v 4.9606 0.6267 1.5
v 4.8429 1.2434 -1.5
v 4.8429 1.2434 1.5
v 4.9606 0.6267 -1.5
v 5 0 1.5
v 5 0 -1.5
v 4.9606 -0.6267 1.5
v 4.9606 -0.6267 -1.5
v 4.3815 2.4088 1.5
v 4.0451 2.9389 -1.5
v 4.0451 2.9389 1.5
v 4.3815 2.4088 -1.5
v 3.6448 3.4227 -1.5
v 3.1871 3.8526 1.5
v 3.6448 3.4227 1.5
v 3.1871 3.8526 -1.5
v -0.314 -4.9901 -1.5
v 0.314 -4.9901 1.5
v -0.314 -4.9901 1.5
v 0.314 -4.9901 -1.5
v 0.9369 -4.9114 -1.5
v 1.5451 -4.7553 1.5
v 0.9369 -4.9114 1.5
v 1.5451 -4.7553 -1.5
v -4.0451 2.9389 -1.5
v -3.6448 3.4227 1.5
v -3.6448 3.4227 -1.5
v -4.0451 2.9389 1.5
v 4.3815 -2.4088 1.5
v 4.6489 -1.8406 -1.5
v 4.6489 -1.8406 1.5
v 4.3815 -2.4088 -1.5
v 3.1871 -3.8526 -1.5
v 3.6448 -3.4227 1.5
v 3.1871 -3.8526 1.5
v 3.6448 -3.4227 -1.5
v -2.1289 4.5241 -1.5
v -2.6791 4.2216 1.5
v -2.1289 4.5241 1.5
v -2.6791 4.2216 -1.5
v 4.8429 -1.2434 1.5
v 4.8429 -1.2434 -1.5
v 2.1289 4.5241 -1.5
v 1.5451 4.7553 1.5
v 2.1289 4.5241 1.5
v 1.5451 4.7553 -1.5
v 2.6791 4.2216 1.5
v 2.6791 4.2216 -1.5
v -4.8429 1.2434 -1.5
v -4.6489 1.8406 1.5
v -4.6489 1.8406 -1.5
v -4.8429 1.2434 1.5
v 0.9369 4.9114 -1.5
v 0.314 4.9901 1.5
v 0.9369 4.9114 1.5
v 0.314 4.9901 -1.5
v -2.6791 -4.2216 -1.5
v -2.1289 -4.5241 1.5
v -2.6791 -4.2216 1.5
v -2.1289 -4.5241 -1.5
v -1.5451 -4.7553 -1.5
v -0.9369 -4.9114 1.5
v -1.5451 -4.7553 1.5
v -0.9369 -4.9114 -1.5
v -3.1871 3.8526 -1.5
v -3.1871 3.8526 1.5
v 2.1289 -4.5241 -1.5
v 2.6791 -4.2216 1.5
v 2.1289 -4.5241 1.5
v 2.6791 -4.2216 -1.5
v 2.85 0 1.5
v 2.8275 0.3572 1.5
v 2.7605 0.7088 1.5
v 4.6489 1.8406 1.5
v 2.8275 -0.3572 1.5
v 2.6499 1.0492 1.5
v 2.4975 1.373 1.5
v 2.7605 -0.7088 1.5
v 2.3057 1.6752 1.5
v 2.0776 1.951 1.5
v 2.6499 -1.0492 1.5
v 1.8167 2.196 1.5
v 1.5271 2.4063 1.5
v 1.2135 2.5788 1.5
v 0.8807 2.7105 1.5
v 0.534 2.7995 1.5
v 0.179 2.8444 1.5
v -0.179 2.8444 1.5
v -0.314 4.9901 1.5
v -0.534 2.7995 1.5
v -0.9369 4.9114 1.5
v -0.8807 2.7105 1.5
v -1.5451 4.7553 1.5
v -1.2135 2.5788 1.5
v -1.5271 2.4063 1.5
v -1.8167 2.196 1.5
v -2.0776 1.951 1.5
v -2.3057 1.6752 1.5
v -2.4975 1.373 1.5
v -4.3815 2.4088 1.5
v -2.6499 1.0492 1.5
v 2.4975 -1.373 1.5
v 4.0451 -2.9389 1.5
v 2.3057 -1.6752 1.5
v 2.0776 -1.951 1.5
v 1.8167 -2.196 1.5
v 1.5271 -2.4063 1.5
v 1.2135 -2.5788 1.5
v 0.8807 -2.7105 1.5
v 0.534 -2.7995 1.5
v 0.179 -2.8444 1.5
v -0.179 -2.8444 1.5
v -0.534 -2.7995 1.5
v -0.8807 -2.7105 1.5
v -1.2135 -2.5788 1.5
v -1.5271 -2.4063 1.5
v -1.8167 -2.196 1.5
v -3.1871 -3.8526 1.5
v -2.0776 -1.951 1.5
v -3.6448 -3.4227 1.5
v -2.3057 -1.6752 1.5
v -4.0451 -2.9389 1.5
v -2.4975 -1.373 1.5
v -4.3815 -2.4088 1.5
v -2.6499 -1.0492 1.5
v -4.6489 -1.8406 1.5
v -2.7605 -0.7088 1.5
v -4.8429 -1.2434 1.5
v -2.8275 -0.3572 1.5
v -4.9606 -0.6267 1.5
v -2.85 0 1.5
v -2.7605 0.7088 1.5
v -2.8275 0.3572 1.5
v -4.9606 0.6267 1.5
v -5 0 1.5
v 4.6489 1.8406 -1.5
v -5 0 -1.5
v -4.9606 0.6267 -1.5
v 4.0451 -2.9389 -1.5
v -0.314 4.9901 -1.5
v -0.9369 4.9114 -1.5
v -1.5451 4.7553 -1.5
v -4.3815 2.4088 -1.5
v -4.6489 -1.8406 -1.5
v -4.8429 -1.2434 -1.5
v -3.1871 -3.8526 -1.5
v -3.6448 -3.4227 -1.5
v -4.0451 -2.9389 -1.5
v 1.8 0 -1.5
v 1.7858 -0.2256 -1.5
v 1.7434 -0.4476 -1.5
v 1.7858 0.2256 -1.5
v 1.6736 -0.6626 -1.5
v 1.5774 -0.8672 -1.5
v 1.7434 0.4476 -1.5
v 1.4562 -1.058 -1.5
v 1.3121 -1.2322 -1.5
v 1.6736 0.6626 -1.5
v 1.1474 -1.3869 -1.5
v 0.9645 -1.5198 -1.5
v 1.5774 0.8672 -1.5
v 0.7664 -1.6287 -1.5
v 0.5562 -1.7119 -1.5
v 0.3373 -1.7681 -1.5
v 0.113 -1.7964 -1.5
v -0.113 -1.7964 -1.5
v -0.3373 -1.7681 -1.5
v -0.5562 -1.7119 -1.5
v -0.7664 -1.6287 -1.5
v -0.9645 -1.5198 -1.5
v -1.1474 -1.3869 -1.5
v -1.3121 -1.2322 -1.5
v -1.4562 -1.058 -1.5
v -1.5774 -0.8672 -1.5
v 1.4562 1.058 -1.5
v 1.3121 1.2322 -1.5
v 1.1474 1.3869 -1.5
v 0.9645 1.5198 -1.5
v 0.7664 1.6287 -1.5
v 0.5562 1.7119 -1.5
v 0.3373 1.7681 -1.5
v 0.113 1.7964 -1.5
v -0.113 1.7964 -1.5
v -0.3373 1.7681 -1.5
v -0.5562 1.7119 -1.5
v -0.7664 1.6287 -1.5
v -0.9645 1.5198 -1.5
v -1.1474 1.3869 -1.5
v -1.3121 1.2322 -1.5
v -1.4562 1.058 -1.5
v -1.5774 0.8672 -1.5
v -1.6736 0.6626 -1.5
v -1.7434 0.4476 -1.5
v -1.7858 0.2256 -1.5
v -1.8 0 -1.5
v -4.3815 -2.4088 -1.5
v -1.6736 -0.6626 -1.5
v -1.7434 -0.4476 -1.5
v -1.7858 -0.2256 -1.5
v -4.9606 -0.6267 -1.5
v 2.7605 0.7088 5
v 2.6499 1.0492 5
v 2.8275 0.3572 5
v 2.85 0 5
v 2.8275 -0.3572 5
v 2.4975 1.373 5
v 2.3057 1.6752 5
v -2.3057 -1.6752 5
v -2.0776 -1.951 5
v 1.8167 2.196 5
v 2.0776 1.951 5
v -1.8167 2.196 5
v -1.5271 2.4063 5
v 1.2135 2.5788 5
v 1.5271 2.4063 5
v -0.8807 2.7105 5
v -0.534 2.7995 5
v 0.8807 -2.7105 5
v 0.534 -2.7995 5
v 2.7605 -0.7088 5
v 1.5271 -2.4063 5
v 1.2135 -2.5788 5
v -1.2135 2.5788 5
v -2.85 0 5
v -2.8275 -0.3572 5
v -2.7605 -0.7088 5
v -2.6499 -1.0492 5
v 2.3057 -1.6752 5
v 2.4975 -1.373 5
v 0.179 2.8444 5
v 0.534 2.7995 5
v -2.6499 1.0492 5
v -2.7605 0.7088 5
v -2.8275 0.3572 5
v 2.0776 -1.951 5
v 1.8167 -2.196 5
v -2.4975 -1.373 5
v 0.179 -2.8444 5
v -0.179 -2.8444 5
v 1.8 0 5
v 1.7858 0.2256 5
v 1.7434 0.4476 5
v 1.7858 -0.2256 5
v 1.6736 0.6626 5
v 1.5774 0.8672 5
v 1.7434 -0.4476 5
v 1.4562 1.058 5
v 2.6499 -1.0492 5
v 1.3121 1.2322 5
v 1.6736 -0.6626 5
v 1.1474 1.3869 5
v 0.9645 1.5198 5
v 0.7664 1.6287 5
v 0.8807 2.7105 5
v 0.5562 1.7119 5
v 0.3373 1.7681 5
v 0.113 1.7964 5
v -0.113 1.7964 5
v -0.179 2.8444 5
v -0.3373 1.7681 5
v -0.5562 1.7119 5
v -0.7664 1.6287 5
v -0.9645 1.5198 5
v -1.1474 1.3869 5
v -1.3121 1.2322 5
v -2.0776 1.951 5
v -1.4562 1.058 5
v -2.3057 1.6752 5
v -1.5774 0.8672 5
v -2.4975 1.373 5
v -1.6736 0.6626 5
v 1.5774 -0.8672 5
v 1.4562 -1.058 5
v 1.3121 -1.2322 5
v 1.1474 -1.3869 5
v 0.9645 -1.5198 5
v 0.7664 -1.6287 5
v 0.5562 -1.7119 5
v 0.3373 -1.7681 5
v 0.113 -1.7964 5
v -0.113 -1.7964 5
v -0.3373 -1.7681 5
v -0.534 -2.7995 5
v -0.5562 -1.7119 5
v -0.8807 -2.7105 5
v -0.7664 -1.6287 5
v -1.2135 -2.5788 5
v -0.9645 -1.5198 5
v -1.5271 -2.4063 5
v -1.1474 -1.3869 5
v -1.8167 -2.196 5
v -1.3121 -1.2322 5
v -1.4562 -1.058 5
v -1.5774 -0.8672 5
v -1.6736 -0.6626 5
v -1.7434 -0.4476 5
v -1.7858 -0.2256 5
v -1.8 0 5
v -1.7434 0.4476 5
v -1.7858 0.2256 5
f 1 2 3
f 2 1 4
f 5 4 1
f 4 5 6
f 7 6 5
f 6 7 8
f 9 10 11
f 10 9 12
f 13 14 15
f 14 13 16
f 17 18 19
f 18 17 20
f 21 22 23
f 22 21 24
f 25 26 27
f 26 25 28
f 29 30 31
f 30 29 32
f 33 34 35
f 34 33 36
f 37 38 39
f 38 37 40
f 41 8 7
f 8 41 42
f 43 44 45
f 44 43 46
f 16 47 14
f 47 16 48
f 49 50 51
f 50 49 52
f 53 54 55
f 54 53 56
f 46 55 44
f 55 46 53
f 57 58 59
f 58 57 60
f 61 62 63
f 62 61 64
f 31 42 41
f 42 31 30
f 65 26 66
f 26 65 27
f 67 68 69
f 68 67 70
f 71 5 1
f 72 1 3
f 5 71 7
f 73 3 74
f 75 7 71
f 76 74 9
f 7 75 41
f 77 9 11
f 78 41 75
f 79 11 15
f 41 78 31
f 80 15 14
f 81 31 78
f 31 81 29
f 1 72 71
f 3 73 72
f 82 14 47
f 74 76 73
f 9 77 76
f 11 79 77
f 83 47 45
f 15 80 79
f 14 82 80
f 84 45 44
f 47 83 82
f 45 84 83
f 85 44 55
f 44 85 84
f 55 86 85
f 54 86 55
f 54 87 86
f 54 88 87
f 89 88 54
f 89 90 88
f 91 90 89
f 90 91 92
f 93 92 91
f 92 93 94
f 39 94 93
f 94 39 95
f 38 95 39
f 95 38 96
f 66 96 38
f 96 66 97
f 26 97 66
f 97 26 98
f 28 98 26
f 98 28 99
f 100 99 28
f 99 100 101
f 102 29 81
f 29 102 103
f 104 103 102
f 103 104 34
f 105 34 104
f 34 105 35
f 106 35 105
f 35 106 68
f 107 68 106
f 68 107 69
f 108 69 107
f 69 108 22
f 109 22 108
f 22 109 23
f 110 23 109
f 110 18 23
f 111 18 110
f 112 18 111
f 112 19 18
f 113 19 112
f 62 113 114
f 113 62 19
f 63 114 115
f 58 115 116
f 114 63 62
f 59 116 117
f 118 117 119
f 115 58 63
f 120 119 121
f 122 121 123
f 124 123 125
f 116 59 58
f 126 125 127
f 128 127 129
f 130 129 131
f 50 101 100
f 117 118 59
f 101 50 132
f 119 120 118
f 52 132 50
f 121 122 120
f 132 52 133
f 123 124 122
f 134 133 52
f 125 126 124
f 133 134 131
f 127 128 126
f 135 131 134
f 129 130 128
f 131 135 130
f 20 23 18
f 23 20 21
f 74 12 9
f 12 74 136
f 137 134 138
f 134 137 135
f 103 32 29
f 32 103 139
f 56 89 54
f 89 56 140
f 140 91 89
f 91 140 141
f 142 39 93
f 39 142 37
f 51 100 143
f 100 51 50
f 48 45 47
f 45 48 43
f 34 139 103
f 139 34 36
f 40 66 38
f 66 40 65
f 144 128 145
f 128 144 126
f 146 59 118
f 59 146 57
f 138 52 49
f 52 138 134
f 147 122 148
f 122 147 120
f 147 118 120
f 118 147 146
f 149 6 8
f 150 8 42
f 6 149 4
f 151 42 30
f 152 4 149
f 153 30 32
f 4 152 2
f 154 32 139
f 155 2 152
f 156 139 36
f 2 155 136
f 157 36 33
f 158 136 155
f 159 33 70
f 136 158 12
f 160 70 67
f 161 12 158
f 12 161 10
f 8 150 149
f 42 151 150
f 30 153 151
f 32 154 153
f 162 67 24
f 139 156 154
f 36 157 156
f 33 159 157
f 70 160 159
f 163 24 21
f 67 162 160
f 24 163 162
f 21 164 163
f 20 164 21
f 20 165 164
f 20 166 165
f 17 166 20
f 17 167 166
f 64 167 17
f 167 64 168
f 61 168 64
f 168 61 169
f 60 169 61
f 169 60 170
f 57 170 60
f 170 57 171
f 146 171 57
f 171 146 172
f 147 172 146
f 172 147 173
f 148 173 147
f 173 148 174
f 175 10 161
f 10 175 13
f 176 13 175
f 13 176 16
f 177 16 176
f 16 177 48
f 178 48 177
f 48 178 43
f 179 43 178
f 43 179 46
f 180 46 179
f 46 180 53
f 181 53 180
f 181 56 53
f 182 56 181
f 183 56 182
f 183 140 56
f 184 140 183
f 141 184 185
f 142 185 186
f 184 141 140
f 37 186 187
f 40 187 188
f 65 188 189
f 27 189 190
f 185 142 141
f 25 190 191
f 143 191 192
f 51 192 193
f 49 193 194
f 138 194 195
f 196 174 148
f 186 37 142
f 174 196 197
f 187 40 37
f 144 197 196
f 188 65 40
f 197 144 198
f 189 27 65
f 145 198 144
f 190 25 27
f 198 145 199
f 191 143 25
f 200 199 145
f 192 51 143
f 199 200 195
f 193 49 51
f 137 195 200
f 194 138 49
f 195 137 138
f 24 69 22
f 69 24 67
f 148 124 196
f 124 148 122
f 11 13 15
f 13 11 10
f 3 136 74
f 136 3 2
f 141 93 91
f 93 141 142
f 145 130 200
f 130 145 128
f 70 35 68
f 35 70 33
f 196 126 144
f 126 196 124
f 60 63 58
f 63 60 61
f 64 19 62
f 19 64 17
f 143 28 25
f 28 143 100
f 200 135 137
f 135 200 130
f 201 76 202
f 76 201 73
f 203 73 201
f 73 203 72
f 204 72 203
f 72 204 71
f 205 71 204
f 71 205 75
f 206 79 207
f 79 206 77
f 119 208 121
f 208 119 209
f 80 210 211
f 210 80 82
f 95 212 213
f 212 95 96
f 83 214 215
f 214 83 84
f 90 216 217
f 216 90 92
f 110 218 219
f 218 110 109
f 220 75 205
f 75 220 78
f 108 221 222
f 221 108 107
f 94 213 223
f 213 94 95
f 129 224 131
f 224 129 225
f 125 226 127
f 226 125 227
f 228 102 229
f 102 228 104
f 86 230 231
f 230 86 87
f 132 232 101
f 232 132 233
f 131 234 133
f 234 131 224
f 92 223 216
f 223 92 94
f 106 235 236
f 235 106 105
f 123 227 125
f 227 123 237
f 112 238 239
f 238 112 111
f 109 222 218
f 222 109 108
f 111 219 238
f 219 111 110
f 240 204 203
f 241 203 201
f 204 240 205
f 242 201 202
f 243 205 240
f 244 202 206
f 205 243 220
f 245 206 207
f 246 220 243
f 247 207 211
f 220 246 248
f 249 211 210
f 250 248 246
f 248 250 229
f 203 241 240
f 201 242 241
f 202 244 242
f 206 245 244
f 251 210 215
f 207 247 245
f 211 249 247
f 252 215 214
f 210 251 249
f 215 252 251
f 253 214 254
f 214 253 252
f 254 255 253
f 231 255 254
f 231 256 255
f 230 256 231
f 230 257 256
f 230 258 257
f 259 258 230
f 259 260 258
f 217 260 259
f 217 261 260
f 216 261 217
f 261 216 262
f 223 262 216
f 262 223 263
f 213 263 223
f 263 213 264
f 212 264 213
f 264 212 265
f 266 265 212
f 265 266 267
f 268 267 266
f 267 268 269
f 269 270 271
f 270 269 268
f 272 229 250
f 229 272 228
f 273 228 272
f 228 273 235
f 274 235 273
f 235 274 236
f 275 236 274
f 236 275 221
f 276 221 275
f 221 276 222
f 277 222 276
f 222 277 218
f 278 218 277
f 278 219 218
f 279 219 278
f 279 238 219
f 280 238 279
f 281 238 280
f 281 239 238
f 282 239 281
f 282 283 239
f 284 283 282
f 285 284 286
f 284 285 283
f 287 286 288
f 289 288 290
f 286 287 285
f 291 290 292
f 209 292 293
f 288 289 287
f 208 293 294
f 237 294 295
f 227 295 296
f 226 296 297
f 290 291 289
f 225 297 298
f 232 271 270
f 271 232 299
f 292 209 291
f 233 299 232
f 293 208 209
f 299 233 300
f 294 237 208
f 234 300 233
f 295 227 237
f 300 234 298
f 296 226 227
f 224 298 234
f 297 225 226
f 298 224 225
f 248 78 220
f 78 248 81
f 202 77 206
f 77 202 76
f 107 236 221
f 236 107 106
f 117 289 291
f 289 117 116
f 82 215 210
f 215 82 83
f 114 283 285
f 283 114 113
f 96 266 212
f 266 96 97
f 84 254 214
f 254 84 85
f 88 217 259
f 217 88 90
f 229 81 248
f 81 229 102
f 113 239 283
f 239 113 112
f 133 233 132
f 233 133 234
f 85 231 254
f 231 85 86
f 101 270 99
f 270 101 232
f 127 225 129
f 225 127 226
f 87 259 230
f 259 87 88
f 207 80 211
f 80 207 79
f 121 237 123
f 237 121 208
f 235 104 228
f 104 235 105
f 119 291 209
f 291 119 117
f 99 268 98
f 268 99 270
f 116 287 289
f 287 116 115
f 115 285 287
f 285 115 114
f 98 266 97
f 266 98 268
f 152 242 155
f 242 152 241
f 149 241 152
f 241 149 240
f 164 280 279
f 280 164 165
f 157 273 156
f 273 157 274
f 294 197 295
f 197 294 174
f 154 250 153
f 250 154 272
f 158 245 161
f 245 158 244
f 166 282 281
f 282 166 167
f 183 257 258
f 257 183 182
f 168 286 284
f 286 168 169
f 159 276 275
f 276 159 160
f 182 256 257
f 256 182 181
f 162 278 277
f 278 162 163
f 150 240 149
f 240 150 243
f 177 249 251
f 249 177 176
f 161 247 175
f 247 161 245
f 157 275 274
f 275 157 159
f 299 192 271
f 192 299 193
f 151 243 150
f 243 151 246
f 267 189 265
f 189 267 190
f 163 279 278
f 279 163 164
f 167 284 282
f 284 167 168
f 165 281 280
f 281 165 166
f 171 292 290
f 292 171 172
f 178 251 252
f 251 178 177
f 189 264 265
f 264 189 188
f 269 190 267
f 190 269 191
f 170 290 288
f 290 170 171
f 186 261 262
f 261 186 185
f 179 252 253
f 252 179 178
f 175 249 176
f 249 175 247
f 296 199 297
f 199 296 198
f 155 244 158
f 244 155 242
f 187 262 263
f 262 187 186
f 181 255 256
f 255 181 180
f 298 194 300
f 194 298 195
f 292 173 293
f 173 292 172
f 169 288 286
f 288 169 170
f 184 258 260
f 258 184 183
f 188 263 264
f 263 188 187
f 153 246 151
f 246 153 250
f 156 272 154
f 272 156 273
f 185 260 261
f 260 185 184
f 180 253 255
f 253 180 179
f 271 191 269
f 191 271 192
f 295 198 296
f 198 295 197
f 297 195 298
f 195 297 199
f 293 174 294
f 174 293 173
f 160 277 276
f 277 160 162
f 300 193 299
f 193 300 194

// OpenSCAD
$fn = 50;


difference() {
	union() {
		translate(v = [0, 0, -1.5000000000]) {
			cylinder(h = 3, r = 5.0000000000);
		}
		translate(v = [0, 0, -1.5000000000]) {
			cylinder(h = 6.5000000000, r = 2.8500000000);
		}
	}
	union() {
		translate(v = [0, 0, -50.0000000000]) {
			cylinder(h = 100, r = 1.8000000000);
		}
	}
}
